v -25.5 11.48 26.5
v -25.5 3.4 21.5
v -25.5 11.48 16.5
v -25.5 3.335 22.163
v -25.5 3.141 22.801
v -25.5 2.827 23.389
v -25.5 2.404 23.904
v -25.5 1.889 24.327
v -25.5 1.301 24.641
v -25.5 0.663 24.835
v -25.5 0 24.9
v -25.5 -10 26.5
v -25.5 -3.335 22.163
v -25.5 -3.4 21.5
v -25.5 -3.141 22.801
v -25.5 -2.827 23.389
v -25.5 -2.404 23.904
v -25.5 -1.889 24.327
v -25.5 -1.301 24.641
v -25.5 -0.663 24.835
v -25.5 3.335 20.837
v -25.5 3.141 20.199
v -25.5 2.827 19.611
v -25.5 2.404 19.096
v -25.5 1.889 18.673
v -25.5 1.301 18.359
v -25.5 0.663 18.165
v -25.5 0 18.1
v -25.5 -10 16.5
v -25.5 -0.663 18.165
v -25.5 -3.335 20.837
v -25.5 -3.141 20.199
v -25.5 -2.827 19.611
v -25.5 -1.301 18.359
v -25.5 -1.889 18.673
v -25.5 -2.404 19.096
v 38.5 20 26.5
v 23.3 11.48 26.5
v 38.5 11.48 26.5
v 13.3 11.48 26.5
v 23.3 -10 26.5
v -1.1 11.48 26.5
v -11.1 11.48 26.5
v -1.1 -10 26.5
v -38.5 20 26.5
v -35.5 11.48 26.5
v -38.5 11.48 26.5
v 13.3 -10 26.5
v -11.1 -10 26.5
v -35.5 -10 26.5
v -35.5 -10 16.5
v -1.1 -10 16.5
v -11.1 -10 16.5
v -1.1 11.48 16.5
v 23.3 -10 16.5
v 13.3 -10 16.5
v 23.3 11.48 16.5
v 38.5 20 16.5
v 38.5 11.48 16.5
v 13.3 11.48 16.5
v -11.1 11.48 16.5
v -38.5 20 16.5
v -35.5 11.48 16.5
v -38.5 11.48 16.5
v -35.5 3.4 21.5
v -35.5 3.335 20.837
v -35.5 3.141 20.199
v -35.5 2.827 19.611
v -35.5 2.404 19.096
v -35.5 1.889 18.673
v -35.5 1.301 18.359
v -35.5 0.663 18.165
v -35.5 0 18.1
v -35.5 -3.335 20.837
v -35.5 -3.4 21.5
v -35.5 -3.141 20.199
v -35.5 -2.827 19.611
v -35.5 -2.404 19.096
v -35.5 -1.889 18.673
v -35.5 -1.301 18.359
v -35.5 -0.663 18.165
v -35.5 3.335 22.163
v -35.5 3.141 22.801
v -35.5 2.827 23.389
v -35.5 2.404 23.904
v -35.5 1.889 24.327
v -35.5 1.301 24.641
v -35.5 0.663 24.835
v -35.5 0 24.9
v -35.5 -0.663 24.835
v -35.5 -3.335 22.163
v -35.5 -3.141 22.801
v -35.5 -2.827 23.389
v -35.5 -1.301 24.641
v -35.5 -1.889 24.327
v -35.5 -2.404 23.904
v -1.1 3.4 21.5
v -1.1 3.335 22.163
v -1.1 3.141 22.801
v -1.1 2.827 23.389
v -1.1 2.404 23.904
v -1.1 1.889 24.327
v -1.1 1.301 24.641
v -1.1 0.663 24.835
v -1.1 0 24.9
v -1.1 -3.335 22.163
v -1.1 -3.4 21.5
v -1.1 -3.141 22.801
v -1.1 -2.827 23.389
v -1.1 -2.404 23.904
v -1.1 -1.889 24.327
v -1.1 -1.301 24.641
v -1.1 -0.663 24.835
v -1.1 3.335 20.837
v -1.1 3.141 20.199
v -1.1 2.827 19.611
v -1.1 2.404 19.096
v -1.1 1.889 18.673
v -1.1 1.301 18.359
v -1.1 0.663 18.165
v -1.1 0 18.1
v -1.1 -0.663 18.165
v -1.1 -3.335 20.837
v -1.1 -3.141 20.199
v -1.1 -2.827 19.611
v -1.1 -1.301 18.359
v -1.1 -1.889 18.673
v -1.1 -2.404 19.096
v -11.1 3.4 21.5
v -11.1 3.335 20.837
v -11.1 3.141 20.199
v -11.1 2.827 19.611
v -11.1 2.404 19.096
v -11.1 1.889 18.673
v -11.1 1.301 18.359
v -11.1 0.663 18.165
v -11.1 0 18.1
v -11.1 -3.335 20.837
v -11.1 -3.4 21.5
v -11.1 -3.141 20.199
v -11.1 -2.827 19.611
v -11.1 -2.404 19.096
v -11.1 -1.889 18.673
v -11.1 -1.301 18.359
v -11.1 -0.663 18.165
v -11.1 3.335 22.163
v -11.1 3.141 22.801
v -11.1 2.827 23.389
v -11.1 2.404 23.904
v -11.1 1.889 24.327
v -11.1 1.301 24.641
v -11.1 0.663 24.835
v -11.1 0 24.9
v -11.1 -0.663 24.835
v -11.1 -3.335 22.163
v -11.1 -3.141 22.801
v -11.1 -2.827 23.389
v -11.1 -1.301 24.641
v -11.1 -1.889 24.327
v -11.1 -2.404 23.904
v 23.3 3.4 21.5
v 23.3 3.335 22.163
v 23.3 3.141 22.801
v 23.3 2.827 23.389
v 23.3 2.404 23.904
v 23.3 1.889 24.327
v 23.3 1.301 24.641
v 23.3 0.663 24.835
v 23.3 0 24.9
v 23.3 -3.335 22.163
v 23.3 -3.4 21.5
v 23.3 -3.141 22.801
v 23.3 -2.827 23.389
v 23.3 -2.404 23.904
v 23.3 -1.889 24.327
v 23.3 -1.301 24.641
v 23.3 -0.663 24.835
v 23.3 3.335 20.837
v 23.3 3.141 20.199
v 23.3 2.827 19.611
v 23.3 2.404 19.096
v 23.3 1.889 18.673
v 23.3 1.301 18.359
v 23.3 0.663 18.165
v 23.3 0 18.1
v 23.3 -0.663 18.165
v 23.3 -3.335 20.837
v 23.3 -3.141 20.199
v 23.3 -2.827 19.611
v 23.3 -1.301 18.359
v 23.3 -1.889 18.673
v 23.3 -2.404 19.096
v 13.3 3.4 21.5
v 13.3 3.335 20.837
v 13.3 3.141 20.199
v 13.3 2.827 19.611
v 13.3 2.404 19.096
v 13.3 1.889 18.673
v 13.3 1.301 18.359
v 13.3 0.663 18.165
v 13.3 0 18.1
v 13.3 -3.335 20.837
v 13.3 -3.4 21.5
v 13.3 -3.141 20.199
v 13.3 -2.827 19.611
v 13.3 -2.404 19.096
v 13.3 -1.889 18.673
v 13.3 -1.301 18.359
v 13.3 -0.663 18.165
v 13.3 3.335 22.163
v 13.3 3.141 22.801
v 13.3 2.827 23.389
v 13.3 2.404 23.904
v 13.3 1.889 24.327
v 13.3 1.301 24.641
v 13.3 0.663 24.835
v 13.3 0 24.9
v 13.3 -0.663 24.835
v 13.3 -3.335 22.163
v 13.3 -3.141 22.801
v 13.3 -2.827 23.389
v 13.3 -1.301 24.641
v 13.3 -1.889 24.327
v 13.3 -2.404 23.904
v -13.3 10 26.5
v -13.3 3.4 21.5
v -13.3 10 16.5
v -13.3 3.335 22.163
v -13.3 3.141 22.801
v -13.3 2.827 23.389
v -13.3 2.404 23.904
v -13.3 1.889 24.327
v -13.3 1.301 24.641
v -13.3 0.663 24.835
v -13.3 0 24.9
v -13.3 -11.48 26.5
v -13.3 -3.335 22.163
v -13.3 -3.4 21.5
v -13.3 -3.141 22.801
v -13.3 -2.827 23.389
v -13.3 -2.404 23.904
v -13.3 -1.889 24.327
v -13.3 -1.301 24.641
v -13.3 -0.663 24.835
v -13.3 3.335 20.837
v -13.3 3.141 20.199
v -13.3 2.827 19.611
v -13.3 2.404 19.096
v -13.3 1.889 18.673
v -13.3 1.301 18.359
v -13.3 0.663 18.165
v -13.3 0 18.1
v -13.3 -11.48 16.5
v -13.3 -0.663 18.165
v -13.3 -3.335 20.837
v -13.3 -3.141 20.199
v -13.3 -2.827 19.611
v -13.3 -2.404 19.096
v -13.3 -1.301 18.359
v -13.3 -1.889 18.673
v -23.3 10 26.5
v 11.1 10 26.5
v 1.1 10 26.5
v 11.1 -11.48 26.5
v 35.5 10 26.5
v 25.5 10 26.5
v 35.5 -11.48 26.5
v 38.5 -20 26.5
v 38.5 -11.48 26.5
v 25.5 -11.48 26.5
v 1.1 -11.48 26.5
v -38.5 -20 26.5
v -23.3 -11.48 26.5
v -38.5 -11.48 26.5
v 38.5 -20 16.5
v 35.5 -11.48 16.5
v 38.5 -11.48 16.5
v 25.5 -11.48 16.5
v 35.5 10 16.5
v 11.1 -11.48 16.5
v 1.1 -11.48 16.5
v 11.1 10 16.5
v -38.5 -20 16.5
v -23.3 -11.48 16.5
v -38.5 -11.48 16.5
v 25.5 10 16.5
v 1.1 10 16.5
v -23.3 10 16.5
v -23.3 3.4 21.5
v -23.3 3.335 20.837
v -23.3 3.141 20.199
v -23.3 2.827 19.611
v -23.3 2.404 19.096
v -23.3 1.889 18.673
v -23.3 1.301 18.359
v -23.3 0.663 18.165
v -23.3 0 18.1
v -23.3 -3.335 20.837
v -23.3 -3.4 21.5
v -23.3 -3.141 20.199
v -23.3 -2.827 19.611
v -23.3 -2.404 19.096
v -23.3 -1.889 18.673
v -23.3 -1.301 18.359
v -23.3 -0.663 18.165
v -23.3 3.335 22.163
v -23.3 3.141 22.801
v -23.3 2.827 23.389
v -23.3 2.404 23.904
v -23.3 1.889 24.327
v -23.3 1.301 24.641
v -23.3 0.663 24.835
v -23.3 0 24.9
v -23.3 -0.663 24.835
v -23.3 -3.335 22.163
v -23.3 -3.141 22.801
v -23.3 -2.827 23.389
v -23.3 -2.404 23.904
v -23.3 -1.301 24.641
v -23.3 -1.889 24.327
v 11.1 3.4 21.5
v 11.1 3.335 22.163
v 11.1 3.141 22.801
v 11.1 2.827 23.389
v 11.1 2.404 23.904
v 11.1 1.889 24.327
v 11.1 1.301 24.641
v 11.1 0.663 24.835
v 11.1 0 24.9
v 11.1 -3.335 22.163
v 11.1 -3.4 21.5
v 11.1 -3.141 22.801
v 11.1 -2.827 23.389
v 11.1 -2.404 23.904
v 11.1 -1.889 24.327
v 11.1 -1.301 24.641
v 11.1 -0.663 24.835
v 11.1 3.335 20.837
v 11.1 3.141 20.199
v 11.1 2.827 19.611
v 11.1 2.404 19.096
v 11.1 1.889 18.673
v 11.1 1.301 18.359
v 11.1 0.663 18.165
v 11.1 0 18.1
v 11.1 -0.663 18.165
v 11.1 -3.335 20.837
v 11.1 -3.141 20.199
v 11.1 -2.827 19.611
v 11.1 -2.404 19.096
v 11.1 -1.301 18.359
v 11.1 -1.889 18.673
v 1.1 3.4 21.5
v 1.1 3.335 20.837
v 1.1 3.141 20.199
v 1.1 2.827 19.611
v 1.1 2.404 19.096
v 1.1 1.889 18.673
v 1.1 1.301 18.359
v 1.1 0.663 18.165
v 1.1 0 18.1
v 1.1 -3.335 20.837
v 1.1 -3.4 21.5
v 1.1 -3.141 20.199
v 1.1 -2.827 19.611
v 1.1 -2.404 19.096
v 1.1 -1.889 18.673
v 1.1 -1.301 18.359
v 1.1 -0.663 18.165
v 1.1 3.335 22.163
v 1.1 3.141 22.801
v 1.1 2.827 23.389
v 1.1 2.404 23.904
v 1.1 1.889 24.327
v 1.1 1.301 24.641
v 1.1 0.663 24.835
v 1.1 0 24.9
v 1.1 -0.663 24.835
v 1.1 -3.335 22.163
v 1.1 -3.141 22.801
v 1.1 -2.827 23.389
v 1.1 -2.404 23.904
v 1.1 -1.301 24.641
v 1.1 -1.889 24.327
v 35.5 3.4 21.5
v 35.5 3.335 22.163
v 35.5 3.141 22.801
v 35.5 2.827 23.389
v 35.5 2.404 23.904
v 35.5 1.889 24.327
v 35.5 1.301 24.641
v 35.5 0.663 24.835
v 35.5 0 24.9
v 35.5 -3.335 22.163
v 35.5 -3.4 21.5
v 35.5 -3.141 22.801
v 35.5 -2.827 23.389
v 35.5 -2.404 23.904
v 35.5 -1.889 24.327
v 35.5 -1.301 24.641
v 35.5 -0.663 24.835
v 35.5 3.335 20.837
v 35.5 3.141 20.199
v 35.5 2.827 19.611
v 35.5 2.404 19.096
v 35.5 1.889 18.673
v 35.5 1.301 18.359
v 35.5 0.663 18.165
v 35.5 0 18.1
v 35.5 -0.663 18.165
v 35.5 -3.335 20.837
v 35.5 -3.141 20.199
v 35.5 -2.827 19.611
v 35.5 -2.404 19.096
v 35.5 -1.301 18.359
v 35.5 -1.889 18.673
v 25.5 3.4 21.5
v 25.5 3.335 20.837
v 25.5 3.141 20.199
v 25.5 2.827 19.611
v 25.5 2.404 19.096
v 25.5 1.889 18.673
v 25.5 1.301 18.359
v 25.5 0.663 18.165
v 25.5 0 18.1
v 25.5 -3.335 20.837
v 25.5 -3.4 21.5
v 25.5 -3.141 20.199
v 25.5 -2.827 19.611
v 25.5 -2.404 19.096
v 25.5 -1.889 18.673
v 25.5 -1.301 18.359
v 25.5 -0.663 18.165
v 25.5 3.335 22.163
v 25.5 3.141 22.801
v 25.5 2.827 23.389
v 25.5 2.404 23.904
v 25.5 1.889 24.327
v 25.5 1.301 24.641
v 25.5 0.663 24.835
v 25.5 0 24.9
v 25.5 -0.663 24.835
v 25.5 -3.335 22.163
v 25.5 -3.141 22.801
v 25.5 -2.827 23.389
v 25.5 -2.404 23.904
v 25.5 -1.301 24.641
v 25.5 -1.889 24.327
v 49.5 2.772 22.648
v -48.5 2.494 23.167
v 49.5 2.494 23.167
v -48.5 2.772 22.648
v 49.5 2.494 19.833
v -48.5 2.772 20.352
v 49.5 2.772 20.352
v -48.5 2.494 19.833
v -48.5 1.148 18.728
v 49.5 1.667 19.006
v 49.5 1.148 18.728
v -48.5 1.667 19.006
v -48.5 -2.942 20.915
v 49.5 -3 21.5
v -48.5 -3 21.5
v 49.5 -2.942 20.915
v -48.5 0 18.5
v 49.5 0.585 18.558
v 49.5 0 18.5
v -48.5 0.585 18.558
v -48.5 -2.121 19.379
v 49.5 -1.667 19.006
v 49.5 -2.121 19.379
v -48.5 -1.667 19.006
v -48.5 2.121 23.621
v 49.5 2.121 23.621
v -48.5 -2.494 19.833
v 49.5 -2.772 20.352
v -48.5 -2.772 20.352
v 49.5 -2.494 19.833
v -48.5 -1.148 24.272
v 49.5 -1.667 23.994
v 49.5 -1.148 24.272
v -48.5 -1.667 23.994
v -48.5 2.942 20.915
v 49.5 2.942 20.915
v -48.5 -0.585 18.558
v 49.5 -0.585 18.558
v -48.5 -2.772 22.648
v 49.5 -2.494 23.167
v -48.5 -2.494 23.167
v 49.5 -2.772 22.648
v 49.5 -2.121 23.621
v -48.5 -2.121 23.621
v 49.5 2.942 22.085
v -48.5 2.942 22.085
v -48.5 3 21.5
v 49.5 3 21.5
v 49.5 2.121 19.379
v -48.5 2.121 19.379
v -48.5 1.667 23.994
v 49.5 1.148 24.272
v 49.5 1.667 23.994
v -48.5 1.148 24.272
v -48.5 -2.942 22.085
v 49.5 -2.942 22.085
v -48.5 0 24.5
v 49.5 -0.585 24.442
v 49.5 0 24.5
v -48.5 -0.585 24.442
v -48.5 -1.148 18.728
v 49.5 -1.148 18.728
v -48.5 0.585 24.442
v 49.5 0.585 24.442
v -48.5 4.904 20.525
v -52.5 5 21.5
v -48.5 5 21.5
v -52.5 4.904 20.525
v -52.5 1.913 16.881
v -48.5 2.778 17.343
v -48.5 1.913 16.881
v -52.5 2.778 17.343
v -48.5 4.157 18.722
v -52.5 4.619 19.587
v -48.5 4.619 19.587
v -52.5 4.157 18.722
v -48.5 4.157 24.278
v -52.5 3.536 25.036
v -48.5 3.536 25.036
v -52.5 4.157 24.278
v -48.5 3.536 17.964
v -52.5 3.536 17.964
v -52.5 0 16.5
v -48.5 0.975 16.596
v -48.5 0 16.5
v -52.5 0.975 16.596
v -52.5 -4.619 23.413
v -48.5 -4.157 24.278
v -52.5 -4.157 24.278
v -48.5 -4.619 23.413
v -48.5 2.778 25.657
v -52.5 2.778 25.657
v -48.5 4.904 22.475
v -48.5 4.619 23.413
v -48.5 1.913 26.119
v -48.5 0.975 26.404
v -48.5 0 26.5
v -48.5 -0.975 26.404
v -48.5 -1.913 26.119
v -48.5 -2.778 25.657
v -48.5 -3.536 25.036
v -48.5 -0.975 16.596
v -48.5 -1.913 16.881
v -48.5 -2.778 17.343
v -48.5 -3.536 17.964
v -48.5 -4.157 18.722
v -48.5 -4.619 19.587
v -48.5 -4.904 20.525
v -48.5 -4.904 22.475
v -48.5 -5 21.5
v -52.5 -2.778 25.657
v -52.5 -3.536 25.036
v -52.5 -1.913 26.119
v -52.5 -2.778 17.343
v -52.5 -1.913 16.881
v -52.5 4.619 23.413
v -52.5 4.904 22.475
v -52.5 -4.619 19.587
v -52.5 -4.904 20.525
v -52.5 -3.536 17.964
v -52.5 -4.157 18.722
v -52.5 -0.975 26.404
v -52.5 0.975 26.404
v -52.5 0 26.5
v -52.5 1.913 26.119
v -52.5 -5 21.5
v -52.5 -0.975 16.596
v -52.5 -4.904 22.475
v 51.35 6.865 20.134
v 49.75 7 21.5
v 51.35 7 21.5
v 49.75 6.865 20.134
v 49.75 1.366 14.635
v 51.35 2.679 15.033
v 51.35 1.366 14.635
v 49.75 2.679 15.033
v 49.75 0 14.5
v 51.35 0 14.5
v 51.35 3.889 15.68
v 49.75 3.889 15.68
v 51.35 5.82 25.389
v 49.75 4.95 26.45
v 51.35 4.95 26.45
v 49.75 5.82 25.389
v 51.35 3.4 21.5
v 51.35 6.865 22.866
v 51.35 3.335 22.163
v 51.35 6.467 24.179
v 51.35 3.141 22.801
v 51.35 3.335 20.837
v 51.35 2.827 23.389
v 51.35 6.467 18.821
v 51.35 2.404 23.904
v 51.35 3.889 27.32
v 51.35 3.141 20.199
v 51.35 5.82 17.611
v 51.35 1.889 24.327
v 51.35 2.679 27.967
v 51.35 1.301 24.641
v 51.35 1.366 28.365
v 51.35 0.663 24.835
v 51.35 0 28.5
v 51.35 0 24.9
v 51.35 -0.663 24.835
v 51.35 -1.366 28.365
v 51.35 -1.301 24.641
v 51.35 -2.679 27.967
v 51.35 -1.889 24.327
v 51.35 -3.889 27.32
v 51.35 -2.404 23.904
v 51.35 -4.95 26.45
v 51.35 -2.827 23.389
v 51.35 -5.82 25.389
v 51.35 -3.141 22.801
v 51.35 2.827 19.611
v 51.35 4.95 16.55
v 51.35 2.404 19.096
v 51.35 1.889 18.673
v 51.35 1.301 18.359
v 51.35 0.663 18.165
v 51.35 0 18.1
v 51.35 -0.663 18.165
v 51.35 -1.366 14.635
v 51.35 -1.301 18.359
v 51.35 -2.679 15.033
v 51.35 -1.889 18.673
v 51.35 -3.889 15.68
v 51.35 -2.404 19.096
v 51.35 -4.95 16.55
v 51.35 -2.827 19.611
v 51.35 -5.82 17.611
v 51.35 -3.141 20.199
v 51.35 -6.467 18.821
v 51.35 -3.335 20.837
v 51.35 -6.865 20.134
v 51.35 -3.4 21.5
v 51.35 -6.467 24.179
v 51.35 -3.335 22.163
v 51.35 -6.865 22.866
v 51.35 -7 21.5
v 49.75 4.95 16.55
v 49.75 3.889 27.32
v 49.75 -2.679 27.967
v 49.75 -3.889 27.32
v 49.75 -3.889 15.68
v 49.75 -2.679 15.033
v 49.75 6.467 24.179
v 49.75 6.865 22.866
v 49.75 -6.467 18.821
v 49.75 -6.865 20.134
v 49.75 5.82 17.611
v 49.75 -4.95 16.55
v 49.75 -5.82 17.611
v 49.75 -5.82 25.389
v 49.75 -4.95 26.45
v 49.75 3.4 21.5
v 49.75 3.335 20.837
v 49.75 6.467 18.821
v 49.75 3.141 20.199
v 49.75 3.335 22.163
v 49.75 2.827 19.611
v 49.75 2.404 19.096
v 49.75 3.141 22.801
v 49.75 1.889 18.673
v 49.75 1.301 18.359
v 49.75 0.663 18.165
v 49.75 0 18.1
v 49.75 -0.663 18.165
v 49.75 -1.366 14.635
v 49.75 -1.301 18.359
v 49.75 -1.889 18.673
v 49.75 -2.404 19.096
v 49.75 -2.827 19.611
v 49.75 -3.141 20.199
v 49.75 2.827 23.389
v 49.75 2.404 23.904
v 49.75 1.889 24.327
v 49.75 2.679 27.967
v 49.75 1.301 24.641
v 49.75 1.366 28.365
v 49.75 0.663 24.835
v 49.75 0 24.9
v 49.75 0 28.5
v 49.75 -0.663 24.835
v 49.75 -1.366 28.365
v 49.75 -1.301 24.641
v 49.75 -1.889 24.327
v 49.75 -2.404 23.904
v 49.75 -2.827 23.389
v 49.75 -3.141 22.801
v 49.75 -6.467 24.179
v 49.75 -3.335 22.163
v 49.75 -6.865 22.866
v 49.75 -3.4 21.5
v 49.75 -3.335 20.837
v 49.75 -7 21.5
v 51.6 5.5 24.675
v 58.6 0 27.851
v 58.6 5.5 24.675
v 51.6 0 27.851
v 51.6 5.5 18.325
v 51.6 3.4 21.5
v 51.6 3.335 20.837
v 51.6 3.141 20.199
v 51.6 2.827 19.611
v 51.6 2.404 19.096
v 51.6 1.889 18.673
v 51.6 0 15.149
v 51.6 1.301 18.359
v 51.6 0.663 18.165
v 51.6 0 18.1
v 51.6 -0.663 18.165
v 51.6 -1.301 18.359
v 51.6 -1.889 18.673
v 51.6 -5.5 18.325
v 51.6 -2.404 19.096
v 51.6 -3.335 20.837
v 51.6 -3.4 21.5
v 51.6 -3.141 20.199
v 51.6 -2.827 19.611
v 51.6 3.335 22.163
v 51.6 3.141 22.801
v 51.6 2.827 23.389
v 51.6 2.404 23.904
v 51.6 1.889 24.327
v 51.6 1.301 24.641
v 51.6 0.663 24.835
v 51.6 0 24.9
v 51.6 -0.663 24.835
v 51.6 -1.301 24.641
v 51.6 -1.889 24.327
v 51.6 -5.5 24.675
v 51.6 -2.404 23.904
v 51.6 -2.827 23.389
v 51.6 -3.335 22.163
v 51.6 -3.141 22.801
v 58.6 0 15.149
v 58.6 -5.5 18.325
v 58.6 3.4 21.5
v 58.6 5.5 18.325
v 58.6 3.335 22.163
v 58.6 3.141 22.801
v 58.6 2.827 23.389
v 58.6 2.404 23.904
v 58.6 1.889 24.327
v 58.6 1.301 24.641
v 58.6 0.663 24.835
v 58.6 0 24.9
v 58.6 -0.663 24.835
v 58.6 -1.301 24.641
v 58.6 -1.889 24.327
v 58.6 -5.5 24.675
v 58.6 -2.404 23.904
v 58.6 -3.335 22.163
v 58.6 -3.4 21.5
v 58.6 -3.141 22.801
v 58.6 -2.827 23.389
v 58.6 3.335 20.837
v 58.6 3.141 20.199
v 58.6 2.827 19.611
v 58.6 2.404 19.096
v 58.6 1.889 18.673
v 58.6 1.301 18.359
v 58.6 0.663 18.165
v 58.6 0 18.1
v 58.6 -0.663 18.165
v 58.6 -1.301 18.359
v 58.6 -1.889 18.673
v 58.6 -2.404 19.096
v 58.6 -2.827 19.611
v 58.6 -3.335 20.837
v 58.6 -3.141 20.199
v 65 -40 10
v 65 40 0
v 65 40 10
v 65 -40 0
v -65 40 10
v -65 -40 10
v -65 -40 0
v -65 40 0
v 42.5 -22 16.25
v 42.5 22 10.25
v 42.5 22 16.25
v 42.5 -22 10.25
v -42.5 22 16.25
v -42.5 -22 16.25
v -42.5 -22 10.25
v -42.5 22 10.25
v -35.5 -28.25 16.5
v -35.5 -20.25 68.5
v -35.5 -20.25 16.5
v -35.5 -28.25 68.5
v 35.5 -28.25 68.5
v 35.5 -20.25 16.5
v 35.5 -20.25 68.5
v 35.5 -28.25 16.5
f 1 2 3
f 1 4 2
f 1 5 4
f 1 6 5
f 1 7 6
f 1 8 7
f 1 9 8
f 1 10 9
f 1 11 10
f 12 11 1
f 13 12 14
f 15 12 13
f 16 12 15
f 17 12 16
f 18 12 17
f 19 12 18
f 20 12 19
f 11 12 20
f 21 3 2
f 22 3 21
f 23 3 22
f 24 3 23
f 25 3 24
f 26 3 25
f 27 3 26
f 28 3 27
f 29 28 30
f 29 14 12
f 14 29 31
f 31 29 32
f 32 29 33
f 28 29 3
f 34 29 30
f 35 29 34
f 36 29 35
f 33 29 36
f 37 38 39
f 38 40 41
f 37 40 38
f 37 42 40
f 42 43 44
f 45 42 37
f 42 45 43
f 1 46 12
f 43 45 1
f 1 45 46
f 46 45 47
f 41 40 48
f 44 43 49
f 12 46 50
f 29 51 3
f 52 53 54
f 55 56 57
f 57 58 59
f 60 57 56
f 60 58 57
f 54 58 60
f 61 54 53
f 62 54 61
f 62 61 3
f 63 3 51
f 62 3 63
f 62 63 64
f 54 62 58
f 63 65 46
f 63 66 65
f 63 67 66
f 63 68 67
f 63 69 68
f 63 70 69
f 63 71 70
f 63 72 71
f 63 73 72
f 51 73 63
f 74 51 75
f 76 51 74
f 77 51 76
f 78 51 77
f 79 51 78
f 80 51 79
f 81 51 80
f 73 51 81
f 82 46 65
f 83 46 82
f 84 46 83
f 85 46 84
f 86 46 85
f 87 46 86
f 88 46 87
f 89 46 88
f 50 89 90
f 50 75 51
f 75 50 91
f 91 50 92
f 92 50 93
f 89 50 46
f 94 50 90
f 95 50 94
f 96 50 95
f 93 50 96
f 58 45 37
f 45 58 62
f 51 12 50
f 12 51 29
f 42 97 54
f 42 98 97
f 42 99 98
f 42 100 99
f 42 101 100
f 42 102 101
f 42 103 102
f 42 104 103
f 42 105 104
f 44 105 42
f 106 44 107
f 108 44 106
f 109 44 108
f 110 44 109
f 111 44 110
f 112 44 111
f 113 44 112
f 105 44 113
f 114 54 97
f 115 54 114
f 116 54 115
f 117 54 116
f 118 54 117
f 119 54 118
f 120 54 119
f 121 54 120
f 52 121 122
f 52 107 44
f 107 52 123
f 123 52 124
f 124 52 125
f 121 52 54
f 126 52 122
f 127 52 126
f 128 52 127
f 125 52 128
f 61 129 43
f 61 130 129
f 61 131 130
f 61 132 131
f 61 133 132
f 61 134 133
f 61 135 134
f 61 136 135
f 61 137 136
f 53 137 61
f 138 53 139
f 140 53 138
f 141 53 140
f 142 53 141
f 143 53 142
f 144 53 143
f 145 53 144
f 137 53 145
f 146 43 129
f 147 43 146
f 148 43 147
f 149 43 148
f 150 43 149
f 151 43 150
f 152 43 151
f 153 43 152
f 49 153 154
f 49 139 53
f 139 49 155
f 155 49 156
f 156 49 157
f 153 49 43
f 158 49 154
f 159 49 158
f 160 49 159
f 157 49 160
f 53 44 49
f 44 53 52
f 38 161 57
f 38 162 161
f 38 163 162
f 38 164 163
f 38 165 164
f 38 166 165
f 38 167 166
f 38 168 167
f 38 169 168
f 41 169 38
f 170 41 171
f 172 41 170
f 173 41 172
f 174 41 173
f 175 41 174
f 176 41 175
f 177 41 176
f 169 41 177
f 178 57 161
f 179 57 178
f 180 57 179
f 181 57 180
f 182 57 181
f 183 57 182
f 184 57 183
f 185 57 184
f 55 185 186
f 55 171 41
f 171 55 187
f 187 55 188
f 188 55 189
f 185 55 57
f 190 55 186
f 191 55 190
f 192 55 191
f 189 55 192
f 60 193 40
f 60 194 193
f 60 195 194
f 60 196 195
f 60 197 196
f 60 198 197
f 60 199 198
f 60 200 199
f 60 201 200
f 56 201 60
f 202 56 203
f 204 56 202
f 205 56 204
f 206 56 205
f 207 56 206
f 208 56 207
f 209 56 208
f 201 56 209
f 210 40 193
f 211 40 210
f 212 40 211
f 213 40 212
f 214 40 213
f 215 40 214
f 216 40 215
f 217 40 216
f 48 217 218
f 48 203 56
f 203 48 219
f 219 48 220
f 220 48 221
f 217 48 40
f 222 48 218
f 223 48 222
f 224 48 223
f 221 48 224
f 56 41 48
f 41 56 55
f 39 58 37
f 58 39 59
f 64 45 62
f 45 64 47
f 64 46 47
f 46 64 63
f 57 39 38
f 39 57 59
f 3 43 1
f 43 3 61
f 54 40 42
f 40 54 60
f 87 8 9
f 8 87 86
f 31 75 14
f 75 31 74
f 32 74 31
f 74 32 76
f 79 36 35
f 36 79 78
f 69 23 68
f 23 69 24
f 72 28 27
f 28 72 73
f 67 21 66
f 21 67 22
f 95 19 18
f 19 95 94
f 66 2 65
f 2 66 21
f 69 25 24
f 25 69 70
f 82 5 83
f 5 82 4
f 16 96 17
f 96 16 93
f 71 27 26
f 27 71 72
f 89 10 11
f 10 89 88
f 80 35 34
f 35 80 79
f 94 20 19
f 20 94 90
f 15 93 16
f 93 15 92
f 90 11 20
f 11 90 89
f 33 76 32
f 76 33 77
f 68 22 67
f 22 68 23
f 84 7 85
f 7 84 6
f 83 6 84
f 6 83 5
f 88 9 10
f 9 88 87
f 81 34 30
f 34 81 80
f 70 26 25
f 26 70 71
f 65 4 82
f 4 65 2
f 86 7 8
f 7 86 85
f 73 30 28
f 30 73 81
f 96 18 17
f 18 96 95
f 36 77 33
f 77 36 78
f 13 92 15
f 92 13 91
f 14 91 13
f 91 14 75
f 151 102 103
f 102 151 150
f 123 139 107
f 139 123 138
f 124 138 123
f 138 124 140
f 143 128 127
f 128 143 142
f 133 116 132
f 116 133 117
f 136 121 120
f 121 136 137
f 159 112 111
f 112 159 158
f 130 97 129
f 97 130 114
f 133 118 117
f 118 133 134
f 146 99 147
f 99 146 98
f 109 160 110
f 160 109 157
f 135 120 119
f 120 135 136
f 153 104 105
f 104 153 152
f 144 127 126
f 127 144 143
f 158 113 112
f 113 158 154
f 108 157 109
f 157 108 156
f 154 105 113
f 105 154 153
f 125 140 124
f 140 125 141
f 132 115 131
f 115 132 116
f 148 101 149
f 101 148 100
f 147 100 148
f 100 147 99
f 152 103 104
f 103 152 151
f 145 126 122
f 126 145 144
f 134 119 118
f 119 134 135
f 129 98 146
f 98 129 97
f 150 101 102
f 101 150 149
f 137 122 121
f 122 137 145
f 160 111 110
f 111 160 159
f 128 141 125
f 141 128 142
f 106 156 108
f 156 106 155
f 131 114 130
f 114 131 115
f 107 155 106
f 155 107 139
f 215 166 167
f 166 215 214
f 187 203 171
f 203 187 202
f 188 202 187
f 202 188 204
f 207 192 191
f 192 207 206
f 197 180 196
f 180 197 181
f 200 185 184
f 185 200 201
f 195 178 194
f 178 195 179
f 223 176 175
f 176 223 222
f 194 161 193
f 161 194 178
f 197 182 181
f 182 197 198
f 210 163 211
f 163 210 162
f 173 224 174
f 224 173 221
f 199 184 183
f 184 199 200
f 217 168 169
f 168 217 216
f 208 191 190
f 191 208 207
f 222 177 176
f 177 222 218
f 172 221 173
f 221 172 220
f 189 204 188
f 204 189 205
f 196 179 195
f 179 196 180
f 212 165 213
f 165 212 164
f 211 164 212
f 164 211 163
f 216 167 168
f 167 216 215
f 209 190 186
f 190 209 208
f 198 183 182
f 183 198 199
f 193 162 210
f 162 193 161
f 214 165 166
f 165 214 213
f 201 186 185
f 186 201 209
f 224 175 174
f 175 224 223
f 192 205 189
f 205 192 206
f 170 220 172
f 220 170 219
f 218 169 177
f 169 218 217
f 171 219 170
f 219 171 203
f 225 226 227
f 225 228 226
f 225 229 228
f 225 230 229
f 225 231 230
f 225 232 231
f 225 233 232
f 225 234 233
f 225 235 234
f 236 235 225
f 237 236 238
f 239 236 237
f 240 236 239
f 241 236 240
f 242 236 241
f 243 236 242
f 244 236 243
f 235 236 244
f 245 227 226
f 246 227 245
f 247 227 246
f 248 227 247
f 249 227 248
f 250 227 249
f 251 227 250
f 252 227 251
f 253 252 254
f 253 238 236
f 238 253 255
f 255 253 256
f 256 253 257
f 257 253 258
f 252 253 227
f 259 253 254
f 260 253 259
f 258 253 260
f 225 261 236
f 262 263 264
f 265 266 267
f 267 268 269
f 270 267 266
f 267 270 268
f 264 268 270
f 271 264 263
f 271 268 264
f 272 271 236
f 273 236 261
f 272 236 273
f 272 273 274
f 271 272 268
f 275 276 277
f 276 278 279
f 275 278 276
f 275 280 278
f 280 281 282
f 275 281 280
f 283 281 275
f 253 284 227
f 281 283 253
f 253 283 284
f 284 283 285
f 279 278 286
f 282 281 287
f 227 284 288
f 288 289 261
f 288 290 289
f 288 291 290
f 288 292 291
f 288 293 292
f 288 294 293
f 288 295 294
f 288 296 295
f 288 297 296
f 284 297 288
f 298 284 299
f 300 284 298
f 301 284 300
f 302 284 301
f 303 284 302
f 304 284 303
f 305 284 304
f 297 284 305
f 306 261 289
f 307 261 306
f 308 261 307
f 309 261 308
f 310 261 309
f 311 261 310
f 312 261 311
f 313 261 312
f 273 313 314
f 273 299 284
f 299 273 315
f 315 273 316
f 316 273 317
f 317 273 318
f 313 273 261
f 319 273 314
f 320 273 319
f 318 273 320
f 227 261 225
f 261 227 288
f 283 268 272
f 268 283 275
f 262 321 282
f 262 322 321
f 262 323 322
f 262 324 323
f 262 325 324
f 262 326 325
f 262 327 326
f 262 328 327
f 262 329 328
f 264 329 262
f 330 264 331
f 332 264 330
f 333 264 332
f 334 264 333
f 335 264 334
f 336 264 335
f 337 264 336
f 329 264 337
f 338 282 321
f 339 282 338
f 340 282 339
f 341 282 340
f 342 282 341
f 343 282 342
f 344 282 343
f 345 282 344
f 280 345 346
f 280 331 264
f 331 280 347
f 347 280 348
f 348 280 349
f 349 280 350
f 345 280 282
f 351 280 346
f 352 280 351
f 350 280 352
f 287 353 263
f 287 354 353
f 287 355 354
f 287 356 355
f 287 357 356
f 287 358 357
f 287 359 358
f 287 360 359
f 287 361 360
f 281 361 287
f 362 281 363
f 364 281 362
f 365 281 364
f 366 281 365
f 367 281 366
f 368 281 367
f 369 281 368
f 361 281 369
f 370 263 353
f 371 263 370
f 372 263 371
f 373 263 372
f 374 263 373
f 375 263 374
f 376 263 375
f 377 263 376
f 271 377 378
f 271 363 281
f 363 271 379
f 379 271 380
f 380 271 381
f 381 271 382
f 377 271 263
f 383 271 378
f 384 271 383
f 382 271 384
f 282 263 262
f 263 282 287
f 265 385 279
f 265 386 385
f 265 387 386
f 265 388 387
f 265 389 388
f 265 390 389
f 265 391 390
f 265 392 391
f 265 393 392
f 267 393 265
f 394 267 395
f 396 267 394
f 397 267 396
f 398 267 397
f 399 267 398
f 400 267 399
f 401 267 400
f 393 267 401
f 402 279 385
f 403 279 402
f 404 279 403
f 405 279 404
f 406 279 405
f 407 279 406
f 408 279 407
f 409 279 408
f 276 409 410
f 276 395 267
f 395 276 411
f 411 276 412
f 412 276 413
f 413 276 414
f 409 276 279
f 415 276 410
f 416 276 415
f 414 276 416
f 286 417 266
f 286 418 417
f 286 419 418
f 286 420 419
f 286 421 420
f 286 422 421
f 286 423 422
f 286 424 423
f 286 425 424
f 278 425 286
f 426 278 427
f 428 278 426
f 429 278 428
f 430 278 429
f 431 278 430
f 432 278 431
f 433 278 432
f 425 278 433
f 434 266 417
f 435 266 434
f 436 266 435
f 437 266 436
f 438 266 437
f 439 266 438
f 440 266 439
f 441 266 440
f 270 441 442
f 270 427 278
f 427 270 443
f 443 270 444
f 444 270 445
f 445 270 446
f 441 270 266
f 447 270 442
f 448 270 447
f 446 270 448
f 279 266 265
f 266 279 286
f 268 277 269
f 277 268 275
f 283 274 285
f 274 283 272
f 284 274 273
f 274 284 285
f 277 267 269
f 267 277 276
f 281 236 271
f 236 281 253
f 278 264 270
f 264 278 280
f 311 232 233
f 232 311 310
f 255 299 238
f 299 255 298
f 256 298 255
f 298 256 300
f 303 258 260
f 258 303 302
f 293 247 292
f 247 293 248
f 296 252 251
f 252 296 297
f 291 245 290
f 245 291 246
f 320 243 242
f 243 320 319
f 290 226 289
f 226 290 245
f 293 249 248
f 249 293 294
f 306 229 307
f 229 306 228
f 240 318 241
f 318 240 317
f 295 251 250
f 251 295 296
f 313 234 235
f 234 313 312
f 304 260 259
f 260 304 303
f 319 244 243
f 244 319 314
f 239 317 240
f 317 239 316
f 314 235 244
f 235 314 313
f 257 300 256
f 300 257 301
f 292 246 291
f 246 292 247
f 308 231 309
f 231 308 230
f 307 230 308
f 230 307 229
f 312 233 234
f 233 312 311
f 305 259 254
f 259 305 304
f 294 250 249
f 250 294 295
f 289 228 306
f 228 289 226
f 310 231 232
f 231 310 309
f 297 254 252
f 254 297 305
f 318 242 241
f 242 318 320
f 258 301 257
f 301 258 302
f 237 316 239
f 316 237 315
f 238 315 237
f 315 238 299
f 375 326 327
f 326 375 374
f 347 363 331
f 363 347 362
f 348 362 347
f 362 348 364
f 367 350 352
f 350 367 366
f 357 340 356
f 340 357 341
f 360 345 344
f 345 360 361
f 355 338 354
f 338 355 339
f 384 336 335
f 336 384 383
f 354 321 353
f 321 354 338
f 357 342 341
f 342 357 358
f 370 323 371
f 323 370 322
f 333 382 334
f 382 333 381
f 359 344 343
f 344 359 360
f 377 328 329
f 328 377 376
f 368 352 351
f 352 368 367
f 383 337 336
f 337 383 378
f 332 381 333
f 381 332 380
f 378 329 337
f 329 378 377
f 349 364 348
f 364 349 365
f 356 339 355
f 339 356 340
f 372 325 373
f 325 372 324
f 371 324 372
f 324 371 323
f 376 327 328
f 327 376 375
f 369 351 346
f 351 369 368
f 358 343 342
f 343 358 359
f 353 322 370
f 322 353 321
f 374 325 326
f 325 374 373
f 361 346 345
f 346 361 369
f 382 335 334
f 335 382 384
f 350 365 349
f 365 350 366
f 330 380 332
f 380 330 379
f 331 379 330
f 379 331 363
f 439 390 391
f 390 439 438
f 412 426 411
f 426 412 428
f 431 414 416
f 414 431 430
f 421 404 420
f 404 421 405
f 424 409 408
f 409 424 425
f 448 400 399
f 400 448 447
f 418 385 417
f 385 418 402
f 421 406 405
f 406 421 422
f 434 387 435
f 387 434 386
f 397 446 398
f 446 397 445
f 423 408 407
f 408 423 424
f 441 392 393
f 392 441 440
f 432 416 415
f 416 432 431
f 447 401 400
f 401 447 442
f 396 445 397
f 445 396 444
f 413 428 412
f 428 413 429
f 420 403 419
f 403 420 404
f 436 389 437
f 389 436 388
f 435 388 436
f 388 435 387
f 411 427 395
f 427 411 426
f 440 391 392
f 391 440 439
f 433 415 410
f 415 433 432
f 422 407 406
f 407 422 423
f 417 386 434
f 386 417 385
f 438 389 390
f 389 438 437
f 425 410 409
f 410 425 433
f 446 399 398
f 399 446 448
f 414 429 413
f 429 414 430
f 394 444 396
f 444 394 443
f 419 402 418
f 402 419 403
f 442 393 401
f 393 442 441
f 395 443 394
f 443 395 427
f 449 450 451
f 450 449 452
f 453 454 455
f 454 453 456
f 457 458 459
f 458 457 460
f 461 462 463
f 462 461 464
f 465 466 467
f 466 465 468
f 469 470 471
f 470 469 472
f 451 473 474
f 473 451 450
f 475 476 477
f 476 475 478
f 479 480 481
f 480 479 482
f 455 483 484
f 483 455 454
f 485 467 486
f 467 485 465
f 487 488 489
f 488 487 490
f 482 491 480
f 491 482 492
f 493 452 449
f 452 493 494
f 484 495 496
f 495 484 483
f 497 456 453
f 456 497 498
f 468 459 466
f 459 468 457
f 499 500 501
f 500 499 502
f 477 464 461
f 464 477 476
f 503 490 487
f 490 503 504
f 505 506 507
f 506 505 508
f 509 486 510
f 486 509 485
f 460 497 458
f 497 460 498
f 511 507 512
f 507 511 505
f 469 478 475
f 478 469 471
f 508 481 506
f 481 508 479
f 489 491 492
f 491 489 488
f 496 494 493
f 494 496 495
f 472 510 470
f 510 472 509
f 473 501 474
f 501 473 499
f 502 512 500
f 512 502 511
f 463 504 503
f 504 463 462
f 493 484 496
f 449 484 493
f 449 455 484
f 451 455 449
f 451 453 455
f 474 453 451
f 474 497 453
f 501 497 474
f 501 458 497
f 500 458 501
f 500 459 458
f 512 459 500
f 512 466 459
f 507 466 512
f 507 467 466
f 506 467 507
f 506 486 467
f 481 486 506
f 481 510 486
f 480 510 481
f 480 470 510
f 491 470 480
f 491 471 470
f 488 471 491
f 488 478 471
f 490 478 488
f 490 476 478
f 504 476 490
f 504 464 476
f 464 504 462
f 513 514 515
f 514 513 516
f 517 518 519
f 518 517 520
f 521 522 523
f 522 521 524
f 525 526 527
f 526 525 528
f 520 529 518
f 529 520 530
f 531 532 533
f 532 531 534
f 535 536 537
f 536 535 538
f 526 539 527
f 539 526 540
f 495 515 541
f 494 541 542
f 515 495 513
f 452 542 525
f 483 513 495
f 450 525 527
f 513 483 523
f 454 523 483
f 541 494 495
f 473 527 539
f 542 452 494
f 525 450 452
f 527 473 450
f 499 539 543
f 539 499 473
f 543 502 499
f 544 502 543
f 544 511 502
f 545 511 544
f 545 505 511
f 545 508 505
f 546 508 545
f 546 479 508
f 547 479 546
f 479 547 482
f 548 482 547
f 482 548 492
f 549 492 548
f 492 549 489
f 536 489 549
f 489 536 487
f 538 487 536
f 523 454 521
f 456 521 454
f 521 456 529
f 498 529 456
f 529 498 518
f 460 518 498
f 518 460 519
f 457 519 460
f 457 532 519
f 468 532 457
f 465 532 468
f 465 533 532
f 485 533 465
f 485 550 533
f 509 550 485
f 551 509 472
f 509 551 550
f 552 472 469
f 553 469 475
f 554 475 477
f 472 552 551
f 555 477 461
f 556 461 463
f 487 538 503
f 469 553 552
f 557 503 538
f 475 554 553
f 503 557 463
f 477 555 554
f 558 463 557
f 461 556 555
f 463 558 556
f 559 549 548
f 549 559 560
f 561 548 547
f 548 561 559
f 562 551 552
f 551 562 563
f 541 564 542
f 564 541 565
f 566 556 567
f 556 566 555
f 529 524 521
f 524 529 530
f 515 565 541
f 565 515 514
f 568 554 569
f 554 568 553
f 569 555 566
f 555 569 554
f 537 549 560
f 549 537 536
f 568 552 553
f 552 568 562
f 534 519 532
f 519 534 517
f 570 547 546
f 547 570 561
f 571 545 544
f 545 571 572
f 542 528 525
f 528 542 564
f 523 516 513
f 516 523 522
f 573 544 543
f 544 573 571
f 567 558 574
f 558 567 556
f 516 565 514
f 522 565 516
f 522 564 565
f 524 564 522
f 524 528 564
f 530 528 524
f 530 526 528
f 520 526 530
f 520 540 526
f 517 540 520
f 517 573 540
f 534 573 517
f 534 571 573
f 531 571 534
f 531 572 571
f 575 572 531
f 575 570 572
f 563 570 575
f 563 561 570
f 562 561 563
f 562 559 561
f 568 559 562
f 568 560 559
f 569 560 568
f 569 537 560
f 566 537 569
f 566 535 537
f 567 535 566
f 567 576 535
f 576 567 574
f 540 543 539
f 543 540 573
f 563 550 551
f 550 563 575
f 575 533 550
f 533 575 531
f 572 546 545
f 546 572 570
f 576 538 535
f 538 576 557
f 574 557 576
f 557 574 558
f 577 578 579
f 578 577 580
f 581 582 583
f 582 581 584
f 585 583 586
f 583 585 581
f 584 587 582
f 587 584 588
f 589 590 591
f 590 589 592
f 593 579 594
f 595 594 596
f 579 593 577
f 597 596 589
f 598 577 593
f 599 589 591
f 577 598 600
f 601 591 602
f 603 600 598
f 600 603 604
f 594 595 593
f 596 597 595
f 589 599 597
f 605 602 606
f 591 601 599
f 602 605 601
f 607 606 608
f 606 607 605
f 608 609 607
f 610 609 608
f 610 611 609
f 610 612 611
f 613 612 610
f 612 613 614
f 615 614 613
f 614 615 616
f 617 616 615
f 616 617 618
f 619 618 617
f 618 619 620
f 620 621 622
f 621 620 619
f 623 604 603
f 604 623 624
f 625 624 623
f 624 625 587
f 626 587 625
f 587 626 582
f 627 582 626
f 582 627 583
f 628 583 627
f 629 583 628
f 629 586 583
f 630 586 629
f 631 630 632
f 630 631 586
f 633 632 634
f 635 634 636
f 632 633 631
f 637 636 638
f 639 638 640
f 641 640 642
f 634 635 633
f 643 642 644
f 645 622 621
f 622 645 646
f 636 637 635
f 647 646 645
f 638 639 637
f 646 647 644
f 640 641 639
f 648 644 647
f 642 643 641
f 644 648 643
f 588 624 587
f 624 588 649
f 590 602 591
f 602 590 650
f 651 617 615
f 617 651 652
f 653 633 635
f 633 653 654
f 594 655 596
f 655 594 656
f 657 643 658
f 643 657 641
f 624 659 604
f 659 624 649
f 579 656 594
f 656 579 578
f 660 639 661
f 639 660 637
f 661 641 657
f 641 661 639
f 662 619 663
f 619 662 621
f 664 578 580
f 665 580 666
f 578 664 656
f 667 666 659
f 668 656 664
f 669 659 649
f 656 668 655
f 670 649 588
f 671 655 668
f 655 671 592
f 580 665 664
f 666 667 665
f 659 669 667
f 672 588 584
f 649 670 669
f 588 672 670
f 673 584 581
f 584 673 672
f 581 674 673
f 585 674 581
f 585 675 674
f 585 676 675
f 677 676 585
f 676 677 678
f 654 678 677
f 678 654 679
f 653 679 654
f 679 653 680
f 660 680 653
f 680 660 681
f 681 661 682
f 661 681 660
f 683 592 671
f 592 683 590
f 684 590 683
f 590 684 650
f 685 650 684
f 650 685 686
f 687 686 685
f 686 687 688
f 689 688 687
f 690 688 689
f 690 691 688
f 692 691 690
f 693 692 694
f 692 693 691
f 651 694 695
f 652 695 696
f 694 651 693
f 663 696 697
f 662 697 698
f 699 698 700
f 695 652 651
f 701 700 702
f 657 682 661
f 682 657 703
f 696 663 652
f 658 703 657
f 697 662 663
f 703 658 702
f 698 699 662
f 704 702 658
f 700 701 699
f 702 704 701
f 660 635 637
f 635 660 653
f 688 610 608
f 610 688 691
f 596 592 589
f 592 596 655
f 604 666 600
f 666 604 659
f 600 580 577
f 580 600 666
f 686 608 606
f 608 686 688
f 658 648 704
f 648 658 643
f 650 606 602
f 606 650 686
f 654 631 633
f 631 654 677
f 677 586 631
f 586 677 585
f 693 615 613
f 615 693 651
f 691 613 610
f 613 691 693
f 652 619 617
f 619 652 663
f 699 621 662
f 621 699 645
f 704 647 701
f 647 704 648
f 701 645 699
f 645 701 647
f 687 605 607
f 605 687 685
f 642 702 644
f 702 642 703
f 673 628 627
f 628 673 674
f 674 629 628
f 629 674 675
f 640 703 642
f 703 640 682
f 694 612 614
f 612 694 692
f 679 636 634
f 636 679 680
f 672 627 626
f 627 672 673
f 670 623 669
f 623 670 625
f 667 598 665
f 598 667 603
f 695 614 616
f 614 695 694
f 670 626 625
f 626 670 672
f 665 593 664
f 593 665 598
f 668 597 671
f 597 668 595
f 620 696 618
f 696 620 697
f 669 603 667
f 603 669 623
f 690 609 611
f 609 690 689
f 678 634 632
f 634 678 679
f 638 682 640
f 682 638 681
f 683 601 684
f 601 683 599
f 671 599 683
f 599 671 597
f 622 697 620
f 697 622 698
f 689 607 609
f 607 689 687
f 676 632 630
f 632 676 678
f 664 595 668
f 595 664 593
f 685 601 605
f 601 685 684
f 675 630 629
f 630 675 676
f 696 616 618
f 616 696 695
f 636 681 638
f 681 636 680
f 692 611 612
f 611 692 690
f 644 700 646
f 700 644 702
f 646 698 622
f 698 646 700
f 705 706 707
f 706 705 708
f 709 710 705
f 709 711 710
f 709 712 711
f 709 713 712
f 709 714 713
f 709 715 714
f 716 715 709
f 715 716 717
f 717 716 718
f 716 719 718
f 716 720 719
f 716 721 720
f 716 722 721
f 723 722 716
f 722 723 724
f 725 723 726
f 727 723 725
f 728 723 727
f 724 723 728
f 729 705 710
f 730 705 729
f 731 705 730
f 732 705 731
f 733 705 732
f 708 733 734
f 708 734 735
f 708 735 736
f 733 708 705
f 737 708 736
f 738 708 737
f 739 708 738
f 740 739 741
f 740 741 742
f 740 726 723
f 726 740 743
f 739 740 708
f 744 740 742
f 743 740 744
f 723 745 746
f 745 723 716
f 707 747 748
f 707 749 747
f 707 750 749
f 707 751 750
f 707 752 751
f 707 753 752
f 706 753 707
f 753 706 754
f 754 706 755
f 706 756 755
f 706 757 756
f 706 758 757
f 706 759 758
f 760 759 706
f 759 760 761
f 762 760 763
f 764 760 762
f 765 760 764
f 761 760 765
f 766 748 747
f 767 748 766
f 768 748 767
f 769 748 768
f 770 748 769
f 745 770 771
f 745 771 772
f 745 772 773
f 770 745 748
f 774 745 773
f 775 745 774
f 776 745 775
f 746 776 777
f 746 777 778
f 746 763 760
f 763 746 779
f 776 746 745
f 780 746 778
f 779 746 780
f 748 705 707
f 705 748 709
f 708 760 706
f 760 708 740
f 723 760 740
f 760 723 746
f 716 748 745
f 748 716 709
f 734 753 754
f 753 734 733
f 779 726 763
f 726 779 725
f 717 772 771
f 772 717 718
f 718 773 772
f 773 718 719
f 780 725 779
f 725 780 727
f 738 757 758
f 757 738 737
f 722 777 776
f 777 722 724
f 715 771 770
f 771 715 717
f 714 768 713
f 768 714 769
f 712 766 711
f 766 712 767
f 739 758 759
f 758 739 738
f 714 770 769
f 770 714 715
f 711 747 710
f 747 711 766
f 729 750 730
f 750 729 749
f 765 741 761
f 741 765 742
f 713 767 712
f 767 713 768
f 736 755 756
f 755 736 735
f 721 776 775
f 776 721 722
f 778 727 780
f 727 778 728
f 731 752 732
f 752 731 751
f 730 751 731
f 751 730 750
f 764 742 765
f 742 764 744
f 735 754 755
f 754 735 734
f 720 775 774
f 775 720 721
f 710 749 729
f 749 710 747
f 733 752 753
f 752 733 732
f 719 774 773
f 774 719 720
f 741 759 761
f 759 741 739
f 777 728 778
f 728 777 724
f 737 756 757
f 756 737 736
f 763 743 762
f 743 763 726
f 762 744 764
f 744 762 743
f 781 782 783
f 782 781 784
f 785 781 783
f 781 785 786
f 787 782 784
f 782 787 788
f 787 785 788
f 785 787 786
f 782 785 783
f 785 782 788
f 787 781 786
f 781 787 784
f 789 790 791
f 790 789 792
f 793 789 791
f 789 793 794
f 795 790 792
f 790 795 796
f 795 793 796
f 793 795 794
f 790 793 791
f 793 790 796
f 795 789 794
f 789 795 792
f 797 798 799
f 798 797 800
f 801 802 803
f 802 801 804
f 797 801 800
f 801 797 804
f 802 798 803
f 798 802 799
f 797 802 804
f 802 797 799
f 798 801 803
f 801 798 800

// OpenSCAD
$fn = 32;

// ------------------------------------------------------------------------
// Comb hinge with flap: leaf 77 x 20 mm, pin d6, flap 52 mm
// Every part is its own module, assembly() places every instance.
// ------------------------------------------------------------------------

// --- part 1 ---
module hinge_bed() {
  difference() {
    translate([-65, -40, 0]) cube([130, 80, 10]);
  }
}

// --- part 2 ---
module hinge_riser() {
  difference() {
    translate([-42.5, -22, 0]) cube([85, 44, 6]);
  }
}

// --- part 3 ---
module hinge_leaf_a() {
  difference() {
    union() {
      translate([-35.5, -10, -5]) cube([10, 30, 10]);
      translate([-11.1, -10, -5]) cube([10, 30, 10]);
      translate([13.3, -10, -5]) cube([10, 30, 10]);
      translate([-38.5, 11.48, -5]) cube([77, 8.52, 10]);
    }
    translate([-30.5, 0, 0]) rotate([0, 90, 0]) cylinder(h = 12, d = 6.8, center = true);
    translate([-6.1, 0, 0]) rotate([0, 90, 0]) cylinder(h = 12, d = 6.8, center = true);
    translate([18.3, 0, 0]) rotate([0, 90, 0]) cylinder(h = 12, d = 6.8, center = true);
  }
}

// --- part 4 ---
module hinge_leaf_b() {
  difference() {
    union() {
      translate([-23.3, -20, -5]) cube([10, 30, 10]);
      translate([1.1, -20, -5]) cube([10, 30, 10]);
      translate([25.5, -20, -5]) cube([10, 30, 10]);
      translate([-38.5, -20, -5]) cube([77, 8.52, 10]);
    }
    translate([-18.3, 0, 0]) rotate([0, 90, 0]) cylinder(h = 12, d = 6.8, center = true);
    translate([6.1, 0, 0]) rotate([0, 90, 0]) cylinder(h = 12, d = 6.8, center = true);
    translate([30.5, 0, 0]) rotate([0, 90, 0]) cylinder(h = 12, d = 6.8, center = true);
  }
}

// --- part 5 ---
module hinge_flap() {
  difference() {
    translate([-35.5, -26, 0]) cube([71, 52, 8]);
  }
}

// --- part 6 ---
module hinge_pin() {
  rotate([0, 90, 0]) cylinder(h = 99, d = 6, center = true);
  translate([-52.5, 0, 0]) rotate([0, 90, 0]) cylinder(h = 4, d = 10);
}

// --- part 7 ---
module pin_washer() {
  difference() {
      translate([0, 0, 0]) cylinder(h = 1.6, d = 14);
      translate([0, 0, -1]) cylinder(h = 3.6, d = 6.8);
    }
}

// --- part 8 ---
module pin_nut() {
  difference() {
    linear_extrude(height = 7) polygon(points = [[6.351, 0], [3.175, 5.5], [-3.175, 5.5], [-6.351, 0], [-3.175, -5.5], [3.175, -5.5]]);
    translate([0, 0, -1]) cylinder(h = 9, d = 6.8);
  }
}

// --- assembly ---
module assembly() {
  color([0.80, 0.24, 0.20]) translate([0, 0, 0]) rotate([0, 0, 0]) hinge_bed();
  color([0.20, 0.45, 0.75]) translate([0, 0, 10.25]) rotate([0, 0, 0]) hinge_riser();
  color([0.25, 0.62, 0.32]) translate([0, 0, 21.5]) rotate([0, 0, 0]) hinge_leaf_a();
  color([0.92, 0.70, 0.18]) translate([0, 0, 21.5]) rotate([0, 0, 0]) hinge_leaf_b();
  color([0.58, 0.35, 0.70]) translate([0, -20.25, 42.5]) rotate([90, 0, 0]) hinge_flap();
  color([0.16, 0.66, 0.66]) translate([0, 0, 21.5]) rotate([0, 0, 0]) hinge_pin();
  color([0.85, 0.48, 0.18]) translate([49.75, 0, 21.5]) rotate([0, 90, 0]) pin_washer();
  color([0.55, 0.60, 0.65]) translate([51.6, 0, 21.5]) rotate([0, 90, 0]) pin_nut();
}

assembly();
